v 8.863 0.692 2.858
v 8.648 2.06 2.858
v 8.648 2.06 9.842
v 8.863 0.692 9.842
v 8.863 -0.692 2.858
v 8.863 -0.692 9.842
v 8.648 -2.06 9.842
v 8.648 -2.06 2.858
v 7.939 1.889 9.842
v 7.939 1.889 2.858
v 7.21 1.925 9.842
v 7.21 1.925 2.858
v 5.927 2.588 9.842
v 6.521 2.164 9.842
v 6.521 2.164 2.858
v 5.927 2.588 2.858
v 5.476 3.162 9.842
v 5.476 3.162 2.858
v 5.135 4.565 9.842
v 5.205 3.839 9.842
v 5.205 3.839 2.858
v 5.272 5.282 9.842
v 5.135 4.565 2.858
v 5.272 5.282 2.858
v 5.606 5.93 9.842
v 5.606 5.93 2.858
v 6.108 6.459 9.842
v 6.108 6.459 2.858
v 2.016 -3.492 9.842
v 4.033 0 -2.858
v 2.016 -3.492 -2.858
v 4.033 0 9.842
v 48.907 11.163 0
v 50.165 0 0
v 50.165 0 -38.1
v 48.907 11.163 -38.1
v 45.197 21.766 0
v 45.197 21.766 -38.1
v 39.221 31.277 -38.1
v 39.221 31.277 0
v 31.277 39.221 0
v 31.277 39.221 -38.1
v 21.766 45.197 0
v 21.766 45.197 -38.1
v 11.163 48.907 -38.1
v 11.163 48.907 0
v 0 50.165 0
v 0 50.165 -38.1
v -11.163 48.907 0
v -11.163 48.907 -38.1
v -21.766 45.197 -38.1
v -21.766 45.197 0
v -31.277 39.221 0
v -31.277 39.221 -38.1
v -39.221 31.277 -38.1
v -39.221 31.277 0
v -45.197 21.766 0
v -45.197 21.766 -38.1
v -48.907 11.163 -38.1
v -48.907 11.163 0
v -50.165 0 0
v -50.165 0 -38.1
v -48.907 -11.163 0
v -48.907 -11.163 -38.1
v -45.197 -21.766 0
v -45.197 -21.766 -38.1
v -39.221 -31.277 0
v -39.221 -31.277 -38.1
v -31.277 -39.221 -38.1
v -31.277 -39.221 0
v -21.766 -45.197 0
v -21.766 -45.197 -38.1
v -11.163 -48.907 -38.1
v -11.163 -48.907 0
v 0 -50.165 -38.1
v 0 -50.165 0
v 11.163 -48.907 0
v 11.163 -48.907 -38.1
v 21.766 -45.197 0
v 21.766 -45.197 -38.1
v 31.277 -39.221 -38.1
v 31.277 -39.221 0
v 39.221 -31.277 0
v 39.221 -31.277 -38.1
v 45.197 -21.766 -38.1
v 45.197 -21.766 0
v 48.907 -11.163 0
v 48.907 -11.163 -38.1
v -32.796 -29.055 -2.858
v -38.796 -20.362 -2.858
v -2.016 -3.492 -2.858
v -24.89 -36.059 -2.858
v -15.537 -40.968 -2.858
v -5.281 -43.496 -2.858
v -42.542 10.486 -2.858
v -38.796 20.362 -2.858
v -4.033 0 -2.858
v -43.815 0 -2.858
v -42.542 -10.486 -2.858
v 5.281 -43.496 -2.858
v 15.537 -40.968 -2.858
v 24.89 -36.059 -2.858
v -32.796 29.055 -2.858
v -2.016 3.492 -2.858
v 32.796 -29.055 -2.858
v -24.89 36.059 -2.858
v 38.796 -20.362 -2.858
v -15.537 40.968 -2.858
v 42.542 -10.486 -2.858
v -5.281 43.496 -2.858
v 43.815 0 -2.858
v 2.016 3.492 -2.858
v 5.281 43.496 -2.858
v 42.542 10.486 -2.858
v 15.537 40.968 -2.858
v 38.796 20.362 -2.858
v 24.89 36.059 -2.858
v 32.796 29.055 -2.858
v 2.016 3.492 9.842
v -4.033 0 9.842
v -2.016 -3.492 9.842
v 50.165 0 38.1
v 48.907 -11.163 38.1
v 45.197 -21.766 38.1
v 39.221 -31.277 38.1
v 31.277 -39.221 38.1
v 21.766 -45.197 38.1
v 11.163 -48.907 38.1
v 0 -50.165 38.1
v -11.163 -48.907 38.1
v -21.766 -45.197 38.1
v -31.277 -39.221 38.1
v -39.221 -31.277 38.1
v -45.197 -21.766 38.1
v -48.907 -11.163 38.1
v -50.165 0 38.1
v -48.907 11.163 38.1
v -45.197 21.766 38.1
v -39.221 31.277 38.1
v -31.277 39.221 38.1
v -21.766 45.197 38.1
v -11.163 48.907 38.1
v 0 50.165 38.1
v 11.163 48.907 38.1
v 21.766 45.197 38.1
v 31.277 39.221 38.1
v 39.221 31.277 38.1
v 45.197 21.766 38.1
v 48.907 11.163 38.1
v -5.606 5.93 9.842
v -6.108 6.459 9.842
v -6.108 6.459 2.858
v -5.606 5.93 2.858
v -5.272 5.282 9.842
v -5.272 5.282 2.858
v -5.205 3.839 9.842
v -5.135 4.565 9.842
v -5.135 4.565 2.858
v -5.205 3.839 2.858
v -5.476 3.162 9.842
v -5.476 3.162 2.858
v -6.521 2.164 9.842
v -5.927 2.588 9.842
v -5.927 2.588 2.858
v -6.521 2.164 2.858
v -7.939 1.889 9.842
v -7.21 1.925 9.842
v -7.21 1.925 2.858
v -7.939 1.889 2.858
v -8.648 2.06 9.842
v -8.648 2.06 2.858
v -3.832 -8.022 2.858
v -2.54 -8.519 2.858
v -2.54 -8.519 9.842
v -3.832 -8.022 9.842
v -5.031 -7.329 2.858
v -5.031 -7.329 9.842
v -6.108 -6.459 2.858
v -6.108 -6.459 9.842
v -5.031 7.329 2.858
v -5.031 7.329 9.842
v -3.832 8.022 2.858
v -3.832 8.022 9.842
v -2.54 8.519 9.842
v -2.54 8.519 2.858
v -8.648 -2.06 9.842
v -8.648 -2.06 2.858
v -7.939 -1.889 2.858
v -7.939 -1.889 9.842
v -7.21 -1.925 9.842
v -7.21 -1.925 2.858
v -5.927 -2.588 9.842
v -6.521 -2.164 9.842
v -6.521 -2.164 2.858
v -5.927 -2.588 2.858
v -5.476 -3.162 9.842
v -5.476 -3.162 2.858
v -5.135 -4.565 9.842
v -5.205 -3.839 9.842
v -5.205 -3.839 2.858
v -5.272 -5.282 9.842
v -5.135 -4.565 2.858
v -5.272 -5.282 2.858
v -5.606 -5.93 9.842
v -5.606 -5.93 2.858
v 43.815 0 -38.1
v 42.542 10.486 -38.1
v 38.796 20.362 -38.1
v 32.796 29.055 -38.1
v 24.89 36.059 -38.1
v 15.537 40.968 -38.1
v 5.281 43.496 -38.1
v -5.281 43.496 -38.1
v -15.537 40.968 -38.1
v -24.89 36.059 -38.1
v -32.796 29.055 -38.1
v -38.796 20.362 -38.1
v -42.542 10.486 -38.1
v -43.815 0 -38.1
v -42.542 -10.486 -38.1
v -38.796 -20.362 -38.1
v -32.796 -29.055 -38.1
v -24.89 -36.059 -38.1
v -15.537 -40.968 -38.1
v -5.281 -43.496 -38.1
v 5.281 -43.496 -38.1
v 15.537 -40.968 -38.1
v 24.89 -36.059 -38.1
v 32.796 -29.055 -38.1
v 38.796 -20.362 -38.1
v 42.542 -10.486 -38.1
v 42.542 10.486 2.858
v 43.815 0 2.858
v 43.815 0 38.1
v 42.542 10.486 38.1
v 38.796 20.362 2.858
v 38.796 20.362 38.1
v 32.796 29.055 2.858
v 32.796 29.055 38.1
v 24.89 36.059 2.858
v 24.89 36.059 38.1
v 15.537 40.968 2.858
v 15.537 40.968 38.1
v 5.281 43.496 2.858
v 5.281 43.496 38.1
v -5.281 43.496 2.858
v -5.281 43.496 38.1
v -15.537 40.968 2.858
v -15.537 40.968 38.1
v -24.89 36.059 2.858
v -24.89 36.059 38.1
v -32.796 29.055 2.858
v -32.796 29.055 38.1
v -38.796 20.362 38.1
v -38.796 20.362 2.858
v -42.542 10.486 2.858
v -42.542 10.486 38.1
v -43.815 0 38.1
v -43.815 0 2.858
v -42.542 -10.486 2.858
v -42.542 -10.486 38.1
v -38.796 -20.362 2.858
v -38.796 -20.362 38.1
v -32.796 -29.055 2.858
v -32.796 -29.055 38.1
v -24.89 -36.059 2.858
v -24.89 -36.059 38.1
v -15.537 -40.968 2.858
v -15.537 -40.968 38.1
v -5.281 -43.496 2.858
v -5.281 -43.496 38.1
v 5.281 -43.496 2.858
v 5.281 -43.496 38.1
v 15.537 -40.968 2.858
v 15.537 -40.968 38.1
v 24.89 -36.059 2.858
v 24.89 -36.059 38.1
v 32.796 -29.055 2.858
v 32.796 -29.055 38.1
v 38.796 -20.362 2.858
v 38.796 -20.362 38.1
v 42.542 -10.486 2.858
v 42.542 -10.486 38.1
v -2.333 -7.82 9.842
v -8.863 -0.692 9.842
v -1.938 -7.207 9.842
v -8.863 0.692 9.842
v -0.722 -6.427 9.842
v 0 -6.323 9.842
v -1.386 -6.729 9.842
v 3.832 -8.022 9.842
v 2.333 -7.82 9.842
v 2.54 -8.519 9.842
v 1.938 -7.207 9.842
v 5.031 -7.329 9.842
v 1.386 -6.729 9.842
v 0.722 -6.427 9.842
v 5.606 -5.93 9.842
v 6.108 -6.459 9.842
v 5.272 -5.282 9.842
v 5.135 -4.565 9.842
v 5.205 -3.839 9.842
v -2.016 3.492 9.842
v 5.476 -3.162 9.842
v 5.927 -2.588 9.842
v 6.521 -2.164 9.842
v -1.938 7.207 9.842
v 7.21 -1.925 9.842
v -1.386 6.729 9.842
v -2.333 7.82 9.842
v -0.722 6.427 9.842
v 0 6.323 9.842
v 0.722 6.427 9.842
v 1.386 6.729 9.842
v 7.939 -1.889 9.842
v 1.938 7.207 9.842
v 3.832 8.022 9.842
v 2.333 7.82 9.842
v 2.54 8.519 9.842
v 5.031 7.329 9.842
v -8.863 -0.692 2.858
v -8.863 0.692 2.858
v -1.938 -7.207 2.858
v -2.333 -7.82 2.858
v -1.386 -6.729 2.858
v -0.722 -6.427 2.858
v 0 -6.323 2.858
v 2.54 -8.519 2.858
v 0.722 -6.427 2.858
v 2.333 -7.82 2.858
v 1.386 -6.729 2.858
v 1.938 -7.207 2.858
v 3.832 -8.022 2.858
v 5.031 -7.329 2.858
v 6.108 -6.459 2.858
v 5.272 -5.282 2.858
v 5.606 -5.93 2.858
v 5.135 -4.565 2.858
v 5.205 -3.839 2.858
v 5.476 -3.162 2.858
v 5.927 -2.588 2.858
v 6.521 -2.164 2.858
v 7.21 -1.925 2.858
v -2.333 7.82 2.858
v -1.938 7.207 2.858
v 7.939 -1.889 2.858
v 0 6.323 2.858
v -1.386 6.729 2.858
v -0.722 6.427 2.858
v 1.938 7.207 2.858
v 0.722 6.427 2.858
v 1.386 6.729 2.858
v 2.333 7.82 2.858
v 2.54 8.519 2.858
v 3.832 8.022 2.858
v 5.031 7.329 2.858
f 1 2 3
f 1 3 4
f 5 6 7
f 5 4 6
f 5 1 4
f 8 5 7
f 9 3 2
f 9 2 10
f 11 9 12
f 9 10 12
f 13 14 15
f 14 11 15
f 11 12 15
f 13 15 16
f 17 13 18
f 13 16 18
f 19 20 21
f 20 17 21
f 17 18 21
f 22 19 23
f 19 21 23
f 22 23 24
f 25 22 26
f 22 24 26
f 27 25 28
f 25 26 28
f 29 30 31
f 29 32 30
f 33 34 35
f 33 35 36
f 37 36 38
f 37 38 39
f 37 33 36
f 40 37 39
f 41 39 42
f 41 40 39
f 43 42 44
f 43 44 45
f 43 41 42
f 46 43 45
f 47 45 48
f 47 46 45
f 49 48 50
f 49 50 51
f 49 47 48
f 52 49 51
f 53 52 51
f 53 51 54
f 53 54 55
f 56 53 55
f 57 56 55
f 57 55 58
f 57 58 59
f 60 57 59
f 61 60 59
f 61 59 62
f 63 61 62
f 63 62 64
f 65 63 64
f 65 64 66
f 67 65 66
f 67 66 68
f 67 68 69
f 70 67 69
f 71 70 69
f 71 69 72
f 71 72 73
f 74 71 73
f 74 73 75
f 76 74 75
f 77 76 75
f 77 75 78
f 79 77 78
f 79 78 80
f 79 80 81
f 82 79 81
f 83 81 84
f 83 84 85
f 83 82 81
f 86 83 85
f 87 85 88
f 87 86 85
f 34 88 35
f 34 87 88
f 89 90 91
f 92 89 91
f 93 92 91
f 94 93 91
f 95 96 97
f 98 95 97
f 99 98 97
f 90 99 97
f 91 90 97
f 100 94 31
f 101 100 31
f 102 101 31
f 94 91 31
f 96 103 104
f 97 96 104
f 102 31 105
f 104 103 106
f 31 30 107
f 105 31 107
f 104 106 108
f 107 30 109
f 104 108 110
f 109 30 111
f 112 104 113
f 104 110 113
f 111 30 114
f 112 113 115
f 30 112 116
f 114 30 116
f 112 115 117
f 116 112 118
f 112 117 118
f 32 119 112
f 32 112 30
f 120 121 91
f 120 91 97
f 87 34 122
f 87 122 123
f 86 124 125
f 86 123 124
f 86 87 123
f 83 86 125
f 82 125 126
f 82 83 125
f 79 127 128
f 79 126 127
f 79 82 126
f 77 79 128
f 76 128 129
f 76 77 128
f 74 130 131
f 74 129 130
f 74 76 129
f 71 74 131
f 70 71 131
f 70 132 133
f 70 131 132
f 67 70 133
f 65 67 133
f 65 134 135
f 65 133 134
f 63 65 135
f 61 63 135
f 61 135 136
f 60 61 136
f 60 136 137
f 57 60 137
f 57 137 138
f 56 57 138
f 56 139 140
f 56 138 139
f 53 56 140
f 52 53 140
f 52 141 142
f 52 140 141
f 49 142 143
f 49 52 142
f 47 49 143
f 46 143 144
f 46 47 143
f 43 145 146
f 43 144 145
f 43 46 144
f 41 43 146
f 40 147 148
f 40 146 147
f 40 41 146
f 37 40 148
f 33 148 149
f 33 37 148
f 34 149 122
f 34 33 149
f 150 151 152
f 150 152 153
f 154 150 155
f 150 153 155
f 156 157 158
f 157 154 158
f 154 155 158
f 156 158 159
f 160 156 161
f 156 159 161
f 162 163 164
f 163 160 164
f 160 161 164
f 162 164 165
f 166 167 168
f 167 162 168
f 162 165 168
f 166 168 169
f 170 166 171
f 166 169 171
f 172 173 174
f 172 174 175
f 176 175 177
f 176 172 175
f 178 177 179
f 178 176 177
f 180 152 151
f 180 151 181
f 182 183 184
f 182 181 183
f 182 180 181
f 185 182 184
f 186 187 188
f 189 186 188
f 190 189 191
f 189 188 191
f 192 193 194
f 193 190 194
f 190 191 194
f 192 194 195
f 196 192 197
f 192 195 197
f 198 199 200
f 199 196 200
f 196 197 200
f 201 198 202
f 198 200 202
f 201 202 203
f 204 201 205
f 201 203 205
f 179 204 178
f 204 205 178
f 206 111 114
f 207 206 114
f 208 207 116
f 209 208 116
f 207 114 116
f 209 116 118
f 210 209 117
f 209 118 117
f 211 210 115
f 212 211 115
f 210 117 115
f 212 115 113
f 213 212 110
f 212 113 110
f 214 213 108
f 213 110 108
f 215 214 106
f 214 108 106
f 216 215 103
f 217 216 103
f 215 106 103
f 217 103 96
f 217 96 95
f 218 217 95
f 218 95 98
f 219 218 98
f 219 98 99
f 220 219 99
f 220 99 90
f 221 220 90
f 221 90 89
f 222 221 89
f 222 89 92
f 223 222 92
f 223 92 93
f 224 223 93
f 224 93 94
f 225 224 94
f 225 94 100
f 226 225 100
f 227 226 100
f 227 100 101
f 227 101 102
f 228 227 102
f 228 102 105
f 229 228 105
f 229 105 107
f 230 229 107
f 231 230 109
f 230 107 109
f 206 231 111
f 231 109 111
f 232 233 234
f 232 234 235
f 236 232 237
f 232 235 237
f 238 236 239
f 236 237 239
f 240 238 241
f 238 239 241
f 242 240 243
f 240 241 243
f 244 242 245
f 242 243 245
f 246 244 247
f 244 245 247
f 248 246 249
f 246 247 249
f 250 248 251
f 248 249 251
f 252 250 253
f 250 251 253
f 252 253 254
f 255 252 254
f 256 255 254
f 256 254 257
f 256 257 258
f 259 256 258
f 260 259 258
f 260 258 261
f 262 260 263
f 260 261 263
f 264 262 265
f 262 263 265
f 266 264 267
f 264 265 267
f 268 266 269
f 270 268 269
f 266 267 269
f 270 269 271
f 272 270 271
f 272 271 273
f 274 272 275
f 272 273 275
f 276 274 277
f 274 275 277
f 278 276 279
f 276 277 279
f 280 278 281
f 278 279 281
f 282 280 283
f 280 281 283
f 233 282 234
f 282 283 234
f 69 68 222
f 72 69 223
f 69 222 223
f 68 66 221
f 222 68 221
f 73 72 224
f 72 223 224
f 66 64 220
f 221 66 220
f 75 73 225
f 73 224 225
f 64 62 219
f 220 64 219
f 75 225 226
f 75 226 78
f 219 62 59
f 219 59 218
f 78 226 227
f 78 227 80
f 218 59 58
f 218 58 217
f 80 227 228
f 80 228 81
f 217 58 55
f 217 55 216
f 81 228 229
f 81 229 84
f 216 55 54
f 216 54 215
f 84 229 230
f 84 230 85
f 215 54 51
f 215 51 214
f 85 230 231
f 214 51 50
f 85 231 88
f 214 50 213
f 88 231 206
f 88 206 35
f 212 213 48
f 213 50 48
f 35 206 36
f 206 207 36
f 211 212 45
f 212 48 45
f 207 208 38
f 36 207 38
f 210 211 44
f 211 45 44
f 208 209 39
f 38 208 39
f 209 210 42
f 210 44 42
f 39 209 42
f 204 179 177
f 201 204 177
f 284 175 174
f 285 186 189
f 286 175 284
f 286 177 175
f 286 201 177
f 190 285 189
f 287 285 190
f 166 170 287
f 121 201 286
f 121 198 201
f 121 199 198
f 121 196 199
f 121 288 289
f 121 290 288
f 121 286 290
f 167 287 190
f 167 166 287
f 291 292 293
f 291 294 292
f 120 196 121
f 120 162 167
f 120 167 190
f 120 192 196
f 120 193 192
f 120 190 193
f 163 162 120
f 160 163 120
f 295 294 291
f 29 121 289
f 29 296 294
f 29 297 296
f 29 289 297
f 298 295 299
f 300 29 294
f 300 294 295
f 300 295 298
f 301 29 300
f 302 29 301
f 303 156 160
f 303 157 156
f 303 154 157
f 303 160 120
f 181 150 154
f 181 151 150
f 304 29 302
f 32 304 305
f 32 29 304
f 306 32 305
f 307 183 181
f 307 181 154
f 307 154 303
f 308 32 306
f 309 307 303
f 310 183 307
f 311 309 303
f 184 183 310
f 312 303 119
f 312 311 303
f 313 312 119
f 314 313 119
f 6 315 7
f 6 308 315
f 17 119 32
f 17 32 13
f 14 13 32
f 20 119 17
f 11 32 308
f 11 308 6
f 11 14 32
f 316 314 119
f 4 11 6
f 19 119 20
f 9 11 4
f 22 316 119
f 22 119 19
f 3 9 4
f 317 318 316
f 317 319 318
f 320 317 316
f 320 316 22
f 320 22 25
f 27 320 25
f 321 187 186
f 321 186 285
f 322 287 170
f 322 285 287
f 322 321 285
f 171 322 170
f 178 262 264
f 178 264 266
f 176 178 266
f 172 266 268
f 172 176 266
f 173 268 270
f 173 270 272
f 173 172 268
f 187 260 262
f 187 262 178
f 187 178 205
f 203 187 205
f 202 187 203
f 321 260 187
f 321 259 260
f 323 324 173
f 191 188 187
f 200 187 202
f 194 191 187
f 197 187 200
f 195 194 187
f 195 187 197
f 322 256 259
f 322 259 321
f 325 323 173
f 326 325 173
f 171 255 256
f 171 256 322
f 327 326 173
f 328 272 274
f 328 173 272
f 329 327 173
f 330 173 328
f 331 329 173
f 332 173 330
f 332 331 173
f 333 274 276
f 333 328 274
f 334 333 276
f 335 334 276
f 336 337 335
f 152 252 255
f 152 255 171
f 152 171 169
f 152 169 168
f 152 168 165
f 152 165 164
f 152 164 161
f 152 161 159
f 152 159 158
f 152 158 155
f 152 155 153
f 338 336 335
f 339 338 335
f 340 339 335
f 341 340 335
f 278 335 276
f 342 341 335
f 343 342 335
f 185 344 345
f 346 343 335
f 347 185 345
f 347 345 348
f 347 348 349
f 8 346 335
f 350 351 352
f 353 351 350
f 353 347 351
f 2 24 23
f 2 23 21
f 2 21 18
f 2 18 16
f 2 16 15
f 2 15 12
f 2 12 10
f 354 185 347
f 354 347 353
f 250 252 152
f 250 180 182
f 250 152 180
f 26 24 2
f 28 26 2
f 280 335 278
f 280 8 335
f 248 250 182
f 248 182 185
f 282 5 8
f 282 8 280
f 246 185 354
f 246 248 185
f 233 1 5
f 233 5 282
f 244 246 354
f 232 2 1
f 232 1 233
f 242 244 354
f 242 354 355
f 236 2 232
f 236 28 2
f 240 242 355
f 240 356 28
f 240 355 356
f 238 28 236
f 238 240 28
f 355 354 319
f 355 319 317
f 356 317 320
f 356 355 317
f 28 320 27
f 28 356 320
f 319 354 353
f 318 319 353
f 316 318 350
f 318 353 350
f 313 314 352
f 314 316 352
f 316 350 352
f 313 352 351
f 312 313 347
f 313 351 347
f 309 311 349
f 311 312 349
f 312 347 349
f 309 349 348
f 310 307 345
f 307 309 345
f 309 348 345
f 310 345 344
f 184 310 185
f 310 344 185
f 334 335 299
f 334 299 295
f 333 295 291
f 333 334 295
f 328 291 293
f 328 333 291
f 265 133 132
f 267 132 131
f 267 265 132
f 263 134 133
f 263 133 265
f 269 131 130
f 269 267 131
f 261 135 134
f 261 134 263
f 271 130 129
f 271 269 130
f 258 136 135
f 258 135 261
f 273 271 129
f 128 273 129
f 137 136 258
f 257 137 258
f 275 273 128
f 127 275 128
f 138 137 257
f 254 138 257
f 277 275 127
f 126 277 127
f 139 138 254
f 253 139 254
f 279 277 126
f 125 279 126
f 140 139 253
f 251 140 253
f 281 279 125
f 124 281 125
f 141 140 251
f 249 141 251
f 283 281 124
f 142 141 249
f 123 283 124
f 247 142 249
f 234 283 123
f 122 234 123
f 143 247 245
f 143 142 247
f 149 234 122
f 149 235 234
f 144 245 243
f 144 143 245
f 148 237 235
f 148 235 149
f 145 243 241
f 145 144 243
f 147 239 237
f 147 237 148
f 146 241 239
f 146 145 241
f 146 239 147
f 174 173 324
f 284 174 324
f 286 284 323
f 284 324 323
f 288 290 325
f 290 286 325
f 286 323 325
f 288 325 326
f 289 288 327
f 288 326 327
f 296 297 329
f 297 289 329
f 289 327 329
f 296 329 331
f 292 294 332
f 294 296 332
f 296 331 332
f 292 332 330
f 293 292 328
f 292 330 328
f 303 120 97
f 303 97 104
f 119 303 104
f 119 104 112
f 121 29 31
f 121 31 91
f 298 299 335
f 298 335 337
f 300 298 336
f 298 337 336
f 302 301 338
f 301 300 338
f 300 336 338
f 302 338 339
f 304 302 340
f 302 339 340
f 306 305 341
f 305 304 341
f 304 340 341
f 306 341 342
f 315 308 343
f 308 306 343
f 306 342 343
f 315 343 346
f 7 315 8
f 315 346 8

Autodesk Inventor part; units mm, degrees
ref_plane "YZ Plane" through (0, 0, 0) normal (1, 0, 0) x (0, 1, 0)
ref_plane "XZ Plane" through (0, 0, 0) normal (0, 1, 0) x (-1, 0, 0)
ref_plane "XY Plane" through (0, 0, 0) normal (0, 0, 1) x (1, 0, 0)
sketch "Sketch1" plane through (0, 0, 0) normal (0, 0, 1) x (1, 0, 0)
  circle A0 centre (0, 0) radius 50.165
  dimension "d0" = 100.33
extrude "Extrusion1" add sketch "Sketch1" along normal mid plane 76.2
sketch "Sketch2" plane through (0, 0, 38.1) normal (0, 0, 1) x (1, 0, 0)
  circle A0 centre (0, 0) radius 43.815
  dimension "d3" = 87.63
extrude "Extrusion2" cut sketch "Sketch2" against normal through all
sketch "Sketch3" plane through (0, 0, 0) normal (0, 0, 1) x (1, 0, 0)
  circle A0 centre (0, 0) radius 43.815 projected
  circle A1 centre (0, 0) radius 43.815
extrude "Extrusion3" add sketch "Sketch3" along normal mid plane 5.715
sketch "Sketch4" plane through (0, 0, 2.8575) normal (0, 0, 1) x (1, 0, 0)
  arc A0 (-8.648, 2.06) -> (-8.648, -2.06) centre (0, 0) ccw
  arc A1 (-2.54, 8.5194) -> (2.54, 8.5194) centre (0, 8.89) ccw
  line L0 (0, 0) -> (0, 8.89) construction
  line L1 (-2.54, 8.5194) -> (2.54, 8.5194) construction
  arc A2 (-8.648, 2.06) -> (-6.108, 6.4594) centre (-7.699, 4.445) ccw
  arc A3 (-6.108, -6.4594) -> (-8.648, -2.06) centre (-7.699, -4.445) ccw
  arc A4 (2.54, -8.5194) -> (-2.54, -8.5194) centre (0, -8.89) ccw
  arc A5 (8.648, -2.06) -> (6.108, -6.4594) centre (7.699, -4.445) ccw
  arc A6 (6.108, 6.4594) -> (8.648, 2.06) centre (7.699, 4.445) ccw
  arc A7 (-6.108, 6.4594) -> (-8.648, 2.06) centre (0, 0) ccw construction
  arc A8 (8.648, 2.06) -> (6.108, 6.4594) centre (0, 0) ccw construction
  arc A9 (6.108, 6.4594) -> (-6.108, 6.4594) centre (0, 0) ccw
  arc A10 (8.648, -2.06) -> (8.648, 2.06) centre (0, 0) ccw
  arc A11 (6.108, -6.4594) -> (8.648, -2.06) centre (0, 0) ccw construction
  arc A12 (2.54, -8.5194) -> (6.108, -6.4594) centre (0, 0) ccw
  arc A13 (-2.54, -8.5194) -> (2.54, -8.5194) centre (0, 0) ccw construction
  arc A14 (-6.108, -6.4594) -> (-2.54, -8.5194) centre (0, 0) ccw
  arc A15 (-8.648, -2.06) -> (-6.108, -6.4594) centre (0, 0) ccw construction
  dimension "d8" = 17.78
  dimension "d10" = 5.08
  dimension "d13" = 360
extrude "Extrusion4" add sketch "Sketch4" along normal blind 6.985 contours A2 A9 A1 A6 A10 A5 A12 A4 A14 A3 A0
sketch "Sketch5" plane through (0, 0, 9.8425) normal (0, 0, 1) x (1, 0, 0)
  line L0 (-2.0164, 3.4925) -> (2.0164, 3.4925)
  line L1 (2.0164, 3.4925) -> (4.0328, 0)
  line L2 (4.0328, 0) -> (2.0164, -3.4925)
  line L3 (2.0164, -3.4925) -> (-2.0164, -3.4925)
  line L4 (-2.0164, -3.4925) -> (-4.0328, 0)
  line L5 (-4.0328, 0) -> (-2.0164, 3.4925)
  point P0 (0, 0)
  point P1 (0, 0)
  dimension "d17" = 6.985
extrude "Extrusion5" cut sketch "Sketch5" against normal through all
properties part number "Wheel_Rim"
